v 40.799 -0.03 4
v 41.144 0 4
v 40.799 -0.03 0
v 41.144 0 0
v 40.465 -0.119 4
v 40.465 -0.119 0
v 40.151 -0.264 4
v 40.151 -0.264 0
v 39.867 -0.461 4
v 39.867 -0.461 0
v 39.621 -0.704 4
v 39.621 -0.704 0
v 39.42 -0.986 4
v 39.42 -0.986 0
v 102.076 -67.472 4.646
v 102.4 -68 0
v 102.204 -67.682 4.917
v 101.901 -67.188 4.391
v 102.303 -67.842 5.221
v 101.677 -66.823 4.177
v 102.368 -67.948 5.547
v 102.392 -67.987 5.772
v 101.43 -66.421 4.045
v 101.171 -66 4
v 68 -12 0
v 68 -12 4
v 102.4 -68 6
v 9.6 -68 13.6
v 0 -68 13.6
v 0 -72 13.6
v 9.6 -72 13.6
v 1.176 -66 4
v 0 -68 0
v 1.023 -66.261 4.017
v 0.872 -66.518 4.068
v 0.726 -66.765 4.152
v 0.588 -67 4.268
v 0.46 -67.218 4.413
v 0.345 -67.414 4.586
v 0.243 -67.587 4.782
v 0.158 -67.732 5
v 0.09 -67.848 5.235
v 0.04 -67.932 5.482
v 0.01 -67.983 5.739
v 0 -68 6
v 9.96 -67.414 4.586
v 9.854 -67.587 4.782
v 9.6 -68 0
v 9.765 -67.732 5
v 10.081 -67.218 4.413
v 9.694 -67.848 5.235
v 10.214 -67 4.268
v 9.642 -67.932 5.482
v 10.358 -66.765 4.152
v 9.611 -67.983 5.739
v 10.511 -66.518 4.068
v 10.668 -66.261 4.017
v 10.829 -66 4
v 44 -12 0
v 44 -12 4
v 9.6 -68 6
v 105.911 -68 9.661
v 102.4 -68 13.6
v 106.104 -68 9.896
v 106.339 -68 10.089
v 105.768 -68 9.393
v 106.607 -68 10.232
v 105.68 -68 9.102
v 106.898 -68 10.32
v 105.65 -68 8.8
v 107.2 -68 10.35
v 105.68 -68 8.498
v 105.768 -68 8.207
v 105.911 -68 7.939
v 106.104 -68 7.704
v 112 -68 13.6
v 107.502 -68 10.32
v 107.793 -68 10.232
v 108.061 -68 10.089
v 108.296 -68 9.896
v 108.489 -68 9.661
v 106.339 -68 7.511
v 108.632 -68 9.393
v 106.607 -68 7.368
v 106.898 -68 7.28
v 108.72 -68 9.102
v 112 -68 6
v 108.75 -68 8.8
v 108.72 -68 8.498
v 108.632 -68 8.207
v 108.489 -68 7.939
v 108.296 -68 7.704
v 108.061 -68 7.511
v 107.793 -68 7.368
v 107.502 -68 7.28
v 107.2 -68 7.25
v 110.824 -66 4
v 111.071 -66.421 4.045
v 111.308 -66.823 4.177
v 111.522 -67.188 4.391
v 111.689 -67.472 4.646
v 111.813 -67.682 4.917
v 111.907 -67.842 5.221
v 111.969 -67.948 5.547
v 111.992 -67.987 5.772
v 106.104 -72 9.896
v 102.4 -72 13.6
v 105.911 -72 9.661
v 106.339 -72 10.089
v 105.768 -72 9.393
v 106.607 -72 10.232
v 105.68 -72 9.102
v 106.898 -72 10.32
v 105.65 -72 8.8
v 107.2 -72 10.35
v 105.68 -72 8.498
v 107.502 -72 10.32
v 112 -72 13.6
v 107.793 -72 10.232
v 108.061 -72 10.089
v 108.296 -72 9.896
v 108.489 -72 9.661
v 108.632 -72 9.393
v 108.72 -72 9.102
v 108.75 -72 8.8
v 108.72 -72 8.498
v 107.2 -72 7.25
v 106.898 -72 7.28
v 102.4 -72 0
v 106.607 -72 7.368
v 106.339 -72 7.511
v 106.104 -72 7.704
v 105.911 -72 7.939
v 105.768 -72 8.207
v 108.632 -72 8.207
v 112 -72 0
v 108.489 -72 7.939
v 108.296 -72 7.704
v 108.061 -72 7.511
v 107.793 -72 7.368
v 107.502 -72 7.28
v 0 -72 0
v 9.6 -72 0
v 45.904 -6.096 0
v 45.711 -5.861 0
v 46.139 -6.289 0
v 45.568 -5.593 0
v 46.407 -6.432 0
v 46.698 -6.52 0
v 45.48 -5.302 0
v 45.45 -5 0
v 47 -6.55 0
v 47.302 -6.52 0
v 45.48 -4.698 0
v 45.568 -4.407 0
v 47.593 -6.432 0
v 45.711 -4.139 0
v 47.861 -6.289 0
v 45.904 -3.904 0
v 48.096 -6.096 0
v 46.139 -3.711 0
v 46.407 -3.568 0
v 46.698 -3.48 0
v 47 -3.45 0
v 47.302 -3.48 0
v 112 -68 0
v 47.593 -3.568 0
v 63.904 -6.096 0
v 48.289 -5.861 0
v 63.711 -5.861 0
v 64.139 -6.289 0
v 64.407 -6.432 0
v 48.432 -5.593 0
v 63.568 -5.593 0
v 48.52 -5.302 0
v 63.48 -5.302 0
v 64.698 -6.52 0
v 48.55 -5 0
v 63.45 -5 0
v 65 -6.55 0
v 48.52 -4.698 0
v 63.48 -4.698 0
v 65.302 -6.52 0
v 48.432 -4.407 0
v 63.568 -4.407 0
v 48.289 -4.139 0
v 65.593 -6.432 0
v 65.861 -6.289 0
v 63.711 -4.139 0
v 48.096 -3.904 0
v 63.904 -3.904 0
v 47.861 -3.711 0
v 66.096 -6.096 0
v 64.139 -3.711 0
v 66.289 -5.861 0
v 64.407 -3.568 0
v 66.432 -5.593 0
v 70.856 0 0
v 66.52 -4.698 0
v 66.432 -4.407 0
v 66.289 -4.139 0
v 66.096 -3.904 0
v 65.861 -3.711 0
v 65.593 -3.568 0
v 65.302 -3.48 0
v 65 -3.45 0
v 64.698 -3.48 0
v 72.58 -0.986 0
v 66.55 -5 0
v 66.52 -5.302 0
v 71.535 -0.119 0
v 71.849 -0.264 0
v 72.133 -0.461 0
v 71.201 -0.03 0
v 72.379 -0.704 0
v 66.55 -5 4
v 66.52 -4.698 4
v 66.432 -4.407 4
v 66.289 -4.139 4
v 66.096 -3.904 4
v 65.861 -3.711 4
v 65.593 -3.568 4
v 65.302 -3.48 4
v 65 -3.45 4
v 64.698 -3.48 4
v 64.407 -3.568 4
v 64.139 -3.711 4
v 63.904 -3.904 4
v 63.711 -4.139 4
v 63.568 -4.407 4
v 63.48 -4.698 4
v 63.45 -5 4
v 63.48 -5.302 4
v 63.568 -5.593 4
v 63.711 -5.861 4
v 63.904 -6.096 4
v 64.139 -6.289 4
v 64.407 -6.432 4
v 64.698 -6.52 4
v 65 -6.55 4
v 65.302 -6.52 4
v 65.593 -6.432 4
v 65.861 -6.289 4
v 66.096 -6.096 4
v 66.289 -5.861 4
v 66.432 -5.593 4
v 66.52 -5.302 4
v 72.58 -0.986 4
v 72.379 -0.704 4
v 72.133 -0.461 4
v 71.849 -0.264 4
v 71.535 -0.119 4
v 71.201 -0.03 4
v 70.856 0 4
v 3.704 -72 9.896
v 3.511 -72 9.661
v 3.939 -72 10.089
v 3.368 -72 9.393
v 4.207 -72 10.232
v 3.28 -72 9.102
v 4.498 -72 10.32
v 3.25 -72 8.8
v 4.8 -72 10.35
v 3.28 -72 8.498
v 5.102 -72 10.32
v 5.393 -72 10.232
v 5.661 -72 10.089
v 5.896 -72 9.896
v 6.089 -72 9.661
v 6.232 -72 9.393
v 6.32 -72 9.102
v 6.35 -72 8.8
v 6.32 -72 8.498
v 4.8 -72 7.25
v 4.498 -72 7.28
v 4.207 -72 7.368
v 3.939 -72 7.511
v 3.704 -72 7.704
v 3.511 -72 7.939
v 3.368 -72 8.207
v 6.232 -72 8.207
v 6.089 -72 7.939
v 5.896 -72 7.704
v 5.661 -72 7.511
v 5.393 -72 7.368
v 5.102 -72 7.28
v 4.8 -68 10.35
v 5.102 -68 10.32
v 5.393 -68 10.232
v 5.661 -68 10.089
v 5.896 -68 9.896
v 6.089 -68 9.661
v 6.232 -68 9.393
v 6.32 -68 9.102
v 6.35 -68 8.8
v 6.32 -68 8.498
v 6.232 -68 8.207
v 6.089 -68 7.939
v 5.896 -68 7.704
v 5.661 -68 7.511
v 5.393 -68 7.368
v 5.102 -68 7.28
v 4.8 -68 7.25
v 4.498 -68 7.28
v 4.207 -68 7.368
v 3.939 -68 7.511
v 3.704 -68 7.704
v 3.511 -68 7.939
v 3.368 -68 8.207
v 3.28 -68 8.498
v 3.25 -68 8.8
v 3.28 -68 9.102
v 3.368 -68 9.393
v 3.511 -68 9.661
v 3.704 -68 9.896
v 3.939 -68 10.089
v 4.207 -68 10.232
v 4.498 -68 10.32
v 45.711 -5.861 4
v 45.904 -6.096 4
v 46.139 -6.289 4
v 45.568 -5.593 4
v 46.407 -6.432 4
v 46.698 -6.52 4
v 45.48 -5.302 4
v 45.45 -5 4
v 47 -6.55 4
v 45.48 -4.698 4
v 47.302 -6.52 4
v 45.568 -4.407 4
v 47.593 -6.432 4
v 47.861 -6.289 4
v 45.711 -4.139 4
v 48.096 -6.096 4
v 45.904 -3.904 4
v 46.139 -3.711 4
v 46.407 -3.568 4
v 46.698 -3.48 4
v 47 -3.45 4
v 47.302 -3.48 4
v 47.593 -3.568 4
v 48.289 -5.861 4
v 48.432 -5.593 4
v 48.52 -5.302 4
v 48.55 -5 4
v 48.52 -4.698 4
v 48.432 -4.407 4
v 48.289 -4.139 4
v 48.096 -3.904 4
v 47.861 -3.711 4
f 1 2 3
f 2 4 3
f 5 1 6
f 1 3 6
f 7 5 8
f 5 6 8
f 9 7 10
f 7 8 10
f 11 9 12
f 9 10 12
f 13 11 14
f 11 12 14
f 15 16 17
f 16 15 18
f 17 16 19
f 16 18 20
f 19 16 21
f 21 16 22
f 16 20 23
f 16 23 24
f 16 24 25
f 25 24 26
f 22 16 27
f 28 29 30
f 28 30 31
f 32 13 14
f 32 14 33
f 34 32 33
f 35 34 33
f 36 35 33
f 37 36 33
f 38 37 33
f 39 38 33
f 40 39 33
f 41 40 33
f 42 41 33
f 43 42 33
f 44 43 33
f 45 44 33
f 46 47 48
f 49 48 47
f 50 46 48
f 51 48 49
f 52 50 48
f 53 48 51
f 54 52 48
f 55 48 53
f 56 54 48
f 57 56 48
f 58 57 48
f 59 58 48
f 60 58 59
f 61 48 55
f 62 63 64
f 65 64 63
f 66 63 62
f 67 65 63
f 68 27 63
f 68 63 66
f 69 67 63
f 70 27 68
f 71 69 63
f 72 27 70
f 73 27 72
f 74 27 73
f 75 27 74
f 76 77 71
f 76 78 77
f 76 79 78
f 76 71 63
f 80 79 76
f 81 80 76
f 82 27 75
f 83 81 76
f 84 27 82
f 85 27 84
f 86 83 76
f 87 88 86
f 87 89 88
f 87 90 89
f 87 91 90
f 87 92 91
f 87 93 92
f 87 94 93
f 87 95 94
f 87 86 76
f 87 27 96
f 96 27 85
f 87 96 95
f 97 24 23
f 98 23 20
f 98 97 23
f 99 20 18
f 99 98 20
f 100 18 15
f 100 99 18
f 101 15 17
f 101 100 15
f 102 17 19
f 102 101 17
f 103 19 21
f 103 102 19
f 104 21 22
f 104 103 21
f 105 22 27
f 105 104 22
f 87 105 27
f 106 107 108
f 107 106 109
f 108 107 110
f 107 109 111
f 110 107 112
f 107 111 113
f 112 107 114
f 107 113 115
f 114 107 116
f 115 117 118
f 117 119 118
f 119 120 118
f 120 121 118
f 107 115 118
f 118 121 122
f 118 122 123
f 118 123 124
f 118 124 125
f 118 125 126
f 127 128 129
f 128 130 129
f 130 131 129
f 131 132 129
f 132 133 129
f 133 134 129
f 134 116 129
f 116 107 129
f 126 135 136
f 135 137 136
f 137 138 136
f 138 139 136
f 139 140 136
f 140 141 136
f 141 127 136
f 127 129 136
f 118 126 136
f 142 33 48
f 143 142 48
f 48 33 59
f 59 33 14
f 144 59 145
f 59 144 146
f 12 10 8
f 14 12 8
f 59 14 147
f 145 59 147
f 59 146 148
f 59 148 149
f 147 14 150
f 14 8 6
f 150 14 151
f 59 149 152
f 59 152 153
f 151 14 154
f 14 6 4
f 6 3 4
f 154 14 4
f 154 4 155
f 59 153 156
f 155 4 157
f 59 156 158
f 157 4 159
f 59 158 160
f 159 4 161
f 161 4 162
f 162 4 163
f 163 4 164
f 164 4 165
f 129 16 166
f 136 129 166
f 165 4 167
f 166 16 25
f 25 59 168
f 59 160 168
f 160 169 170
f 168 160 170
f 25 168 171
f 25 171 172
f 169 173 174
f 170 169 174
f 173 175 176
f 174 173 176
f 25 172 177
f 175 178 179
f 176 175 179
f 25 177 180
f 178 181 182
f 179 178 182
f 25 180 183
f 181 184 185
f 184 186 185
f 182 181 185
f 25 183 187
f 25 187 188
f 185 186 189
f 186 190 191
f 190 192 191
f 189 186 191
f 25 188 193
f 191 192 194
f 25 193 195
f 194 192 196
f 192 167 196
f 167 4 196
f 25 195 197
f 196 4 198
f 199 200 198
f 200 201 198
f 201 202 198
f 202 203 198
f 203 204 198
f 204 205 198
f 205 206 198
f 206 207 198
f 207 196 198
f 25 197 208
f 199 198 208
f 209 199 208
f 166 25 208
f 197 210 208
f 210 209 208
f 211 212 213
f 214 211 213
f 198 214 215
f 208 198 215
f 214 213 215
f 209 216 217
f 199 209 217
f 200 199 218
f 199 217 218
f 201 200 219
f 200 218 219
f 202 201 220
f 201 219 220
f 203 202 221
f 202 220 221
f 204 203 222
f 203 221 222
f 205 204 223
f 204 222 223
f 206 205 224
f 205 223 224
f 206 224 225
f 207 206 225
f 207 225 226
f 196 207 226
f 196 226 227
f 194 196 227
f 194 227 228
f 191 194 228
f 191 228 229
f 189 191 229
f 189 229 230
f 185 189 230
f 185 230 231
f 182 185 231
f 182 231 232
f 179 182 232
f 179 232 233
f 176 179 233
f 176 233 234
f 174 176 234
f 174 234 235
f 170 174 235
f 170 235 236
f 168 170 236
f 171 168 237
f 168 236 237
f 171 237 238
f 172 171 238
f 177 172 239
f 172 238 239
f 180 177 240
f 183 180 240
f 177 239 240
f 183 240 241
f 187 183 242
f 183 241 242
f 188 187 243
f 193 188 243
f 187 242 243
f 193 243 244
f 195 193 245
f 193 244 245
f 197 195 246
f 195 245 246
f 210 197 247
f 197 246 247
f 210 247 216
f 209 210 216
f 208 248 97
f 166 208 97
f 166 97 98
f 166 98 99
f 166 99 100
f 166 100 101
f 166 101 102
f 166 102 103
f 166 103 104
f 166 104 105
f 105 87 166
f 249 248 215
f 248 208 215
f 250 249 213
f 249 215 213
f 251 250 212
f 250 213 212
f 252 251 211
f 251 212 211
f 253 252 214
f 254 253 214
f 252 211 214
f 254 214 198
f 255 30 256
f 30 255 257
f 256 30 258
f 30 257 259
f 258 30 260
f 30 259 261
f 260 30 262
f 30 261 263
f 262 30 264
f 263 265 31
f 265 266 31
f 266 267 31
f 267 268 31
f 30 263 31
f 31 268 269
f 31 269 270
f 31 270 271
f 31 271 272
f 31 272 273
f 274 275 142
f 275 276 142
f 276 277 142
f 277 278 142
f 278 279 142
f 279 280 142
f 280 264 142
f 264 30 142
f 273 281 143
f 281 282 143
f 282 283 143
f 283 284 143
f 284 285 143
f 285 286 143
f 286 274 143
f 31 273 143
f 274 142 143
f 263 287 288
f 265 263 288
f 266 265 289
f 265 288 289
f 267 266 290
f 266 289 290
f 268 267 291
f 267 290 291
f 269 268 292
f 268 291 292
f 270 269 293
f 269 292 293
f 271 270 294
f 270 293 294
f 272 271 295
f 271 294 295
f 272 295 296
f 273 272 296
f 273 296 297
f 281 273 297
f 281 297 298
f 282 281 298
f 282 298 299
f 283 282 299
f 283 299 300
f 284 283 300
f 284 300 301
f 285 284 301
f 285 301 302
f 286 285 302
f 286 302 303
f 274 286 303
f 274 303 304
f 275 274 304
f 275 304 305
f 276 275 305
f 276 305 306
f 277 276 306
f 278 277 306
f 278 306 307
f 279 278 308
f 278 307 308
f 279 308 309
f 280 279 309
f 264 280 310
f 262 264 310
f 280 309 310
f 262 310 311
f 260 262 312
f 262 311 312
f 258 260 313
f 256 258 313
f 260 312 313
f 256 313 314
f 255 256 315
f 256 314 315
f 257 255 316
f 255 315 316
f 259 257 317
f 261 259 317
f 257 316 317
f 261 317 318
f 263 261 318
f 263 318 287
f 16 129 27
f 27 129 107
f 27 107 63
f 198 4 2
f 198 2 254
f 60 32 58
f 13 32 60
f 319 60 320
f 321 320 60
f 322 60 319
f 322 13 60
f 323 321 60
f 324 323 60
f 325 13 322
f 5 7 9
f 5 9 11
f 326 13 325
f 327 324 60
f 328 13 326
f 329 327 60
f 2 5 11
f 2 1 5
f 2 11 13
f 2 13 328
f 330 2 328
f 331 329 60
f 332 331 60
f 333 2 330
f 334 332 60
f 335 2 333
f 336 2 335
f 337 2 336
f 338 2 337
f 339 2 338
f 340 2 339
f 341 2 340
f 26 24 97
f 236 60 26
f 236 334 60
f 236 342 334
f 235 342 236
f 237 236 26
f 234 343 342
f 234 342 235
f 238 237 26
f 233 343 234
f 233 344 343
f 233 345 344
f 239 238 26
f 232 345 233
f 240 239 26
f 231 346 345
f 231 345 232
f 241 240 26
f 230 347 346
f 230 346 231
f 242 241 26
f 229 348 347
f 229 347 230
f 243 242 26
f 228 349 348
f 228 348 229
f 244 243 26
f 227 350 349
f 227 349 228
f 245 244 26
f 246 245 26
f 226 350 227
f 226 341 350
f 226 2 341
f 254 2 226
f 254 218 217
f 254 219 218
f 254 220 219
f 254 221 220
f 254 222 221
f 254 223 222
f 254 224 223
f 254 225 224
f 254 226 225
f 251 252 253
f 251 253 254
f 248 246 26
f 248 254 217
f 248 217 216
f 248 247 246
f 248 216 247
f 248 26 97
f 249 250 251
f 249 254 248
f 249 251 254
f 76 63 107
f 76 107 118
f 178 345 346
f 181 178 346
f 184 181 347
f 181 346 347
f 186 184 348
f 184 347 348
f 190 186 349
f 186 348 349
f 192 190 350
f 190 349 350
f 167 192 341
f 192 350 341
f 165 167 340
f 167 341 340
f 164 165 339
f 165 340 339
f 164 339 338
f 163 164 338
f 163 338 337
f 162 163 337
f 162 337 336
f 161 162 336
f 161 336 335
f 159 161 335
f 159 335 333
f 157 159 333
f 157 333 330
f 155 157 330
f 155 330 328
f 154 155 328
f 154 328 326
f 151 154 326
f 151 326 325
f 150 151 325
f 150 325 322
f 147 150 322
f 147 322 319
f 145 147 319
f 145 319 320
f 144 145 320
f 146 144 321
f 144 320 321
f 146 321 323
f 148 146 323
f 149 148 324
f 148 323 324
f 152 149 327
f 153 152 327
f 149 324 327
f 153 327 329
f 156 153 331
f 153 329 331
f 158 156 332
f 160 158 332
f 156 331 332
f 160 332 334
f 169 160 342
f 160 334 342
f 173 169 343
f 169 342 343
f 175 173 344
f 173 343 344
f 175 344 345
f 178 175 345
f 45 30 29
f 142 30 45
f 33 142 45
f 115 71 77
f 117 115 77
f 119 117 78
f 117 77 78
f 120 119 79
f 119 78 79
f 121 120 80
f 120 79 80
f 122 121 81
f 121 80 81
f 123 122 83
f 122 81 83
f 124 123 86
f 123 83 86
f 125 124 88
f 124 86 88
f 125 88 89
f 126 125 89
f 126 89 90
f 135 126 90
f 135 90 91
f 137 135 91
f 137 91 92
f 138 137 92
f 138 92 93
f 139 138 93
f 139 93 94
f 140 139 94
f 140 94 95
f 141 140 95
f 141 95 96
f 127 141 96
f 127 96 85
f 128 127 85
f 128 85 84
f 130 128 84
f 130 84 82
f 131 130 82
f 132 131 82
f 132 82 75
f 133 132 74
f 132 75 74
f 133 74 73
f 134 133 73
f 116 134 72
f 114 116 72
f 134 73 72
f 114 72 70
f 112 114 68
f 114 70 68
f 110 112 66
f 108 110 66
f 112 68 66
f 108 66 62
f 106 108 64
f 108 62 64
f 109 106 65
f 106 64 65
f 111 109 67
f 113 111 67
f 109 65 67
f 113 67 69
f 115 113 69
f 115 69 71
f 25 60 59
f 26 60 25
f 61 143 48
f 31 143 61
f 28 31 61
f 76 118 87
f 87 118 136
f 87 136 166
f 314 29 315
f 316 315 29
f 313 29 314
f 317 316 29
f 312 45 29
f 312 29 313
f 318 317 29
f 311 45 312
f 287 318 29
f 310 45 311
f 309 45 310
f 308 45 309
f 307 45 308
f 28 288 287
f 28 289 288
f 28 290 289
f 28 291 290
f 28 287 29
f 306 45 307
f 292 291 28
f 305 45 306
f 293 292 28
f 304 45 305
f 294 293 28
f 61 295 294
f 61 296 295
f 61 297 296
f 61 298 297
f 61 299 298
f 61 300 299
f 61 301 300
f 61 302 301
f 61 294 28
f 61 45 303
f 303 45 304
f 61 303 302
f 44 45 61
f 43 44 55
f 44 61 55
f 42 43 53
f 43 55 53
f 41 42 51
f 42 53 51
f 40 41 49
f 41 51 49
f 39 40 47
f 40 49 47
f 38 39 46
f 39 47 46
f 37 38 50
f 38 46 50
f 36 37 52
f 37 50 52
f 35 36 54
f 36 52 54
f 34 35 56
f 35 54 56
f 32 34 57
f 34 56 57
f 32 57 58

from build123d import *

# Parameters (mm, degrees)
SKETCH1_W           = 112
SKETCH1_H           = 72
BOSS_EXTRUDE1_DEPTH = 4
SKETCH2_W           = 9.6
SKETCH2_H           = 4
BOSS_EXTRUDE2_DEPTH = 9.6
SKETCH3_R           = 1.55
CUT_EXTRUDE1_DEPTH  = 9.6
SKETCH4_R           = 1.55
CUT_EXTRUDE2_DEPTH  = 9.6
CUT_EXTRUDE4_DEPTH  = 9.6
CUT_EXTRUDE5_DEPTH  = 9.6
CUT_EXTRUDE6_DEPTH  = 10
FILLET1_R           = 2
FILLET2_R           = 2


with BuildPart() as part:
    # Sketch1 → Boss-Extrude1 (new body)
    with BuildSketch(Plane.XY):
        with Locations((56, -36)):
            Rectangle(SKETCH1_W, SKETCH1_H)
    extrude(amount=BOSS_EXTRUDE1_DEPTH)

    # Sketch2 → Boss-Extrude2 (add)
    with BuildSketch(Plane.XY.offset(4)):
        with Locations((4.8, -70)):
            Rectangle(SKETCH2_W, SKETCH2_H)
        with Locations((107.2, -70)):
            Rectangle(SKETCH2_W, SKETCH2_H)
        with Locations((56, -70)):
            Rectangle(SKETCH2_W, SKETCH2_H)
    extrude(amount=BOSS_EXTRUDE2_DEPTH)

    # Sketch3 → Cut-Extrude1 (cut)
    with BuildSketch(Plane(origin=(0, -68, 0), x_dir=(1, 0, 0), z_dir=(0, 1, 0))):
        with Locations(Location((4.8, -8.8, 0), (0, 0, 270))):
            Circle(SKETCH3_R)
        with Locations(Location((56, -8.8, 0), (0, 0, 270))):
            Circle(SKETCH3_R)
        with Locations(Location((107.2, -8.8, 0), (0, 0, 270))):
            Circle(SKETCH3_R)
    extrude(amount=-CUT_EXTRUDE1_DEPTH, mode=Mode.SUBTRACT)

    # Sketch4 → Cut-Extrude2 (cut)
    with BuildSketch(Plane.XY.offset(4)):
        with Locations((47, -5)):
            Circle(SKETCH4_R)
        with Locations((65, -5)):
            Circle(SKETCH4_R)
        with Locations((56, -14)):
            Circle(SKETCH4_R)
    extrude(amount=-CUT_EXTRUDE2_DEPTH, mode=Mode.SUBTRACT)

    # Sketch5 → Cut-Extrude4 (cut)
    with BuildSketch(Plane.XY.offset(4)):
        Polygon((0, -68), (0, 0), (40, 0), align=None)
        Polygon((72, 0), (112, -68), (112, 0), align=None)
    extrude(amount=-CUT_EXTRUDE4_DEPTH, mode=Mode.SUBTRACT)

    # Sketch6 → Cut-Extrude5 (cut)
    with BuildSketch(Plane.XY.offset(4)):
        Polygon((9.6, -68), (44, -12), (51.2, -68), (51.2, -72), (9.6, -72), align=None)
        Polygon((102.4, -72), (102.4, -68), (68, -12), (60.8, -68), (60.8, -72), align=None)
    extrude(amount=-CUT_EXTRUDE5_DEPTH, mode=Mode.SUBTRACT)

    # Sketch7 → Cut-Extrude6 (cut)
    with BuildSketch(Plane.XY.offset(4)):
        Polygon((44, -12), (68, -12), (68, -81.921915354), (38.62828306, -80.469678764), align=None)
    extrude(amount=-CUT_EXTRUDE6_DEPTH, mode=Mode.SUBTRACT)


with BuildPart() as body_2:
    # of the pieces the cut leaves, the one that is kept (cut_extrude6_keep)
    add(part.part.solids().sort_by_distance((40, 0, 0))[0])

    # Fillet1
    fillet1_edges = [body_2.edges().sort_by_distance(p)[0] for p in [
        (4.8, -68, 4),
        (107.2, -68, 4),
    ]]
    fillet(fillet1_edges, radius=FILLET1_R)

    # Fillet2
    fillet2_edges = [body_2.edges().sort_by_distance(p)[0] for p in [
        (40, 0, 2),
        (72, 0, 2),
    ]]
    fillet(fillet2_edges, radius=FILLET2_R)


solid = body_2.part
